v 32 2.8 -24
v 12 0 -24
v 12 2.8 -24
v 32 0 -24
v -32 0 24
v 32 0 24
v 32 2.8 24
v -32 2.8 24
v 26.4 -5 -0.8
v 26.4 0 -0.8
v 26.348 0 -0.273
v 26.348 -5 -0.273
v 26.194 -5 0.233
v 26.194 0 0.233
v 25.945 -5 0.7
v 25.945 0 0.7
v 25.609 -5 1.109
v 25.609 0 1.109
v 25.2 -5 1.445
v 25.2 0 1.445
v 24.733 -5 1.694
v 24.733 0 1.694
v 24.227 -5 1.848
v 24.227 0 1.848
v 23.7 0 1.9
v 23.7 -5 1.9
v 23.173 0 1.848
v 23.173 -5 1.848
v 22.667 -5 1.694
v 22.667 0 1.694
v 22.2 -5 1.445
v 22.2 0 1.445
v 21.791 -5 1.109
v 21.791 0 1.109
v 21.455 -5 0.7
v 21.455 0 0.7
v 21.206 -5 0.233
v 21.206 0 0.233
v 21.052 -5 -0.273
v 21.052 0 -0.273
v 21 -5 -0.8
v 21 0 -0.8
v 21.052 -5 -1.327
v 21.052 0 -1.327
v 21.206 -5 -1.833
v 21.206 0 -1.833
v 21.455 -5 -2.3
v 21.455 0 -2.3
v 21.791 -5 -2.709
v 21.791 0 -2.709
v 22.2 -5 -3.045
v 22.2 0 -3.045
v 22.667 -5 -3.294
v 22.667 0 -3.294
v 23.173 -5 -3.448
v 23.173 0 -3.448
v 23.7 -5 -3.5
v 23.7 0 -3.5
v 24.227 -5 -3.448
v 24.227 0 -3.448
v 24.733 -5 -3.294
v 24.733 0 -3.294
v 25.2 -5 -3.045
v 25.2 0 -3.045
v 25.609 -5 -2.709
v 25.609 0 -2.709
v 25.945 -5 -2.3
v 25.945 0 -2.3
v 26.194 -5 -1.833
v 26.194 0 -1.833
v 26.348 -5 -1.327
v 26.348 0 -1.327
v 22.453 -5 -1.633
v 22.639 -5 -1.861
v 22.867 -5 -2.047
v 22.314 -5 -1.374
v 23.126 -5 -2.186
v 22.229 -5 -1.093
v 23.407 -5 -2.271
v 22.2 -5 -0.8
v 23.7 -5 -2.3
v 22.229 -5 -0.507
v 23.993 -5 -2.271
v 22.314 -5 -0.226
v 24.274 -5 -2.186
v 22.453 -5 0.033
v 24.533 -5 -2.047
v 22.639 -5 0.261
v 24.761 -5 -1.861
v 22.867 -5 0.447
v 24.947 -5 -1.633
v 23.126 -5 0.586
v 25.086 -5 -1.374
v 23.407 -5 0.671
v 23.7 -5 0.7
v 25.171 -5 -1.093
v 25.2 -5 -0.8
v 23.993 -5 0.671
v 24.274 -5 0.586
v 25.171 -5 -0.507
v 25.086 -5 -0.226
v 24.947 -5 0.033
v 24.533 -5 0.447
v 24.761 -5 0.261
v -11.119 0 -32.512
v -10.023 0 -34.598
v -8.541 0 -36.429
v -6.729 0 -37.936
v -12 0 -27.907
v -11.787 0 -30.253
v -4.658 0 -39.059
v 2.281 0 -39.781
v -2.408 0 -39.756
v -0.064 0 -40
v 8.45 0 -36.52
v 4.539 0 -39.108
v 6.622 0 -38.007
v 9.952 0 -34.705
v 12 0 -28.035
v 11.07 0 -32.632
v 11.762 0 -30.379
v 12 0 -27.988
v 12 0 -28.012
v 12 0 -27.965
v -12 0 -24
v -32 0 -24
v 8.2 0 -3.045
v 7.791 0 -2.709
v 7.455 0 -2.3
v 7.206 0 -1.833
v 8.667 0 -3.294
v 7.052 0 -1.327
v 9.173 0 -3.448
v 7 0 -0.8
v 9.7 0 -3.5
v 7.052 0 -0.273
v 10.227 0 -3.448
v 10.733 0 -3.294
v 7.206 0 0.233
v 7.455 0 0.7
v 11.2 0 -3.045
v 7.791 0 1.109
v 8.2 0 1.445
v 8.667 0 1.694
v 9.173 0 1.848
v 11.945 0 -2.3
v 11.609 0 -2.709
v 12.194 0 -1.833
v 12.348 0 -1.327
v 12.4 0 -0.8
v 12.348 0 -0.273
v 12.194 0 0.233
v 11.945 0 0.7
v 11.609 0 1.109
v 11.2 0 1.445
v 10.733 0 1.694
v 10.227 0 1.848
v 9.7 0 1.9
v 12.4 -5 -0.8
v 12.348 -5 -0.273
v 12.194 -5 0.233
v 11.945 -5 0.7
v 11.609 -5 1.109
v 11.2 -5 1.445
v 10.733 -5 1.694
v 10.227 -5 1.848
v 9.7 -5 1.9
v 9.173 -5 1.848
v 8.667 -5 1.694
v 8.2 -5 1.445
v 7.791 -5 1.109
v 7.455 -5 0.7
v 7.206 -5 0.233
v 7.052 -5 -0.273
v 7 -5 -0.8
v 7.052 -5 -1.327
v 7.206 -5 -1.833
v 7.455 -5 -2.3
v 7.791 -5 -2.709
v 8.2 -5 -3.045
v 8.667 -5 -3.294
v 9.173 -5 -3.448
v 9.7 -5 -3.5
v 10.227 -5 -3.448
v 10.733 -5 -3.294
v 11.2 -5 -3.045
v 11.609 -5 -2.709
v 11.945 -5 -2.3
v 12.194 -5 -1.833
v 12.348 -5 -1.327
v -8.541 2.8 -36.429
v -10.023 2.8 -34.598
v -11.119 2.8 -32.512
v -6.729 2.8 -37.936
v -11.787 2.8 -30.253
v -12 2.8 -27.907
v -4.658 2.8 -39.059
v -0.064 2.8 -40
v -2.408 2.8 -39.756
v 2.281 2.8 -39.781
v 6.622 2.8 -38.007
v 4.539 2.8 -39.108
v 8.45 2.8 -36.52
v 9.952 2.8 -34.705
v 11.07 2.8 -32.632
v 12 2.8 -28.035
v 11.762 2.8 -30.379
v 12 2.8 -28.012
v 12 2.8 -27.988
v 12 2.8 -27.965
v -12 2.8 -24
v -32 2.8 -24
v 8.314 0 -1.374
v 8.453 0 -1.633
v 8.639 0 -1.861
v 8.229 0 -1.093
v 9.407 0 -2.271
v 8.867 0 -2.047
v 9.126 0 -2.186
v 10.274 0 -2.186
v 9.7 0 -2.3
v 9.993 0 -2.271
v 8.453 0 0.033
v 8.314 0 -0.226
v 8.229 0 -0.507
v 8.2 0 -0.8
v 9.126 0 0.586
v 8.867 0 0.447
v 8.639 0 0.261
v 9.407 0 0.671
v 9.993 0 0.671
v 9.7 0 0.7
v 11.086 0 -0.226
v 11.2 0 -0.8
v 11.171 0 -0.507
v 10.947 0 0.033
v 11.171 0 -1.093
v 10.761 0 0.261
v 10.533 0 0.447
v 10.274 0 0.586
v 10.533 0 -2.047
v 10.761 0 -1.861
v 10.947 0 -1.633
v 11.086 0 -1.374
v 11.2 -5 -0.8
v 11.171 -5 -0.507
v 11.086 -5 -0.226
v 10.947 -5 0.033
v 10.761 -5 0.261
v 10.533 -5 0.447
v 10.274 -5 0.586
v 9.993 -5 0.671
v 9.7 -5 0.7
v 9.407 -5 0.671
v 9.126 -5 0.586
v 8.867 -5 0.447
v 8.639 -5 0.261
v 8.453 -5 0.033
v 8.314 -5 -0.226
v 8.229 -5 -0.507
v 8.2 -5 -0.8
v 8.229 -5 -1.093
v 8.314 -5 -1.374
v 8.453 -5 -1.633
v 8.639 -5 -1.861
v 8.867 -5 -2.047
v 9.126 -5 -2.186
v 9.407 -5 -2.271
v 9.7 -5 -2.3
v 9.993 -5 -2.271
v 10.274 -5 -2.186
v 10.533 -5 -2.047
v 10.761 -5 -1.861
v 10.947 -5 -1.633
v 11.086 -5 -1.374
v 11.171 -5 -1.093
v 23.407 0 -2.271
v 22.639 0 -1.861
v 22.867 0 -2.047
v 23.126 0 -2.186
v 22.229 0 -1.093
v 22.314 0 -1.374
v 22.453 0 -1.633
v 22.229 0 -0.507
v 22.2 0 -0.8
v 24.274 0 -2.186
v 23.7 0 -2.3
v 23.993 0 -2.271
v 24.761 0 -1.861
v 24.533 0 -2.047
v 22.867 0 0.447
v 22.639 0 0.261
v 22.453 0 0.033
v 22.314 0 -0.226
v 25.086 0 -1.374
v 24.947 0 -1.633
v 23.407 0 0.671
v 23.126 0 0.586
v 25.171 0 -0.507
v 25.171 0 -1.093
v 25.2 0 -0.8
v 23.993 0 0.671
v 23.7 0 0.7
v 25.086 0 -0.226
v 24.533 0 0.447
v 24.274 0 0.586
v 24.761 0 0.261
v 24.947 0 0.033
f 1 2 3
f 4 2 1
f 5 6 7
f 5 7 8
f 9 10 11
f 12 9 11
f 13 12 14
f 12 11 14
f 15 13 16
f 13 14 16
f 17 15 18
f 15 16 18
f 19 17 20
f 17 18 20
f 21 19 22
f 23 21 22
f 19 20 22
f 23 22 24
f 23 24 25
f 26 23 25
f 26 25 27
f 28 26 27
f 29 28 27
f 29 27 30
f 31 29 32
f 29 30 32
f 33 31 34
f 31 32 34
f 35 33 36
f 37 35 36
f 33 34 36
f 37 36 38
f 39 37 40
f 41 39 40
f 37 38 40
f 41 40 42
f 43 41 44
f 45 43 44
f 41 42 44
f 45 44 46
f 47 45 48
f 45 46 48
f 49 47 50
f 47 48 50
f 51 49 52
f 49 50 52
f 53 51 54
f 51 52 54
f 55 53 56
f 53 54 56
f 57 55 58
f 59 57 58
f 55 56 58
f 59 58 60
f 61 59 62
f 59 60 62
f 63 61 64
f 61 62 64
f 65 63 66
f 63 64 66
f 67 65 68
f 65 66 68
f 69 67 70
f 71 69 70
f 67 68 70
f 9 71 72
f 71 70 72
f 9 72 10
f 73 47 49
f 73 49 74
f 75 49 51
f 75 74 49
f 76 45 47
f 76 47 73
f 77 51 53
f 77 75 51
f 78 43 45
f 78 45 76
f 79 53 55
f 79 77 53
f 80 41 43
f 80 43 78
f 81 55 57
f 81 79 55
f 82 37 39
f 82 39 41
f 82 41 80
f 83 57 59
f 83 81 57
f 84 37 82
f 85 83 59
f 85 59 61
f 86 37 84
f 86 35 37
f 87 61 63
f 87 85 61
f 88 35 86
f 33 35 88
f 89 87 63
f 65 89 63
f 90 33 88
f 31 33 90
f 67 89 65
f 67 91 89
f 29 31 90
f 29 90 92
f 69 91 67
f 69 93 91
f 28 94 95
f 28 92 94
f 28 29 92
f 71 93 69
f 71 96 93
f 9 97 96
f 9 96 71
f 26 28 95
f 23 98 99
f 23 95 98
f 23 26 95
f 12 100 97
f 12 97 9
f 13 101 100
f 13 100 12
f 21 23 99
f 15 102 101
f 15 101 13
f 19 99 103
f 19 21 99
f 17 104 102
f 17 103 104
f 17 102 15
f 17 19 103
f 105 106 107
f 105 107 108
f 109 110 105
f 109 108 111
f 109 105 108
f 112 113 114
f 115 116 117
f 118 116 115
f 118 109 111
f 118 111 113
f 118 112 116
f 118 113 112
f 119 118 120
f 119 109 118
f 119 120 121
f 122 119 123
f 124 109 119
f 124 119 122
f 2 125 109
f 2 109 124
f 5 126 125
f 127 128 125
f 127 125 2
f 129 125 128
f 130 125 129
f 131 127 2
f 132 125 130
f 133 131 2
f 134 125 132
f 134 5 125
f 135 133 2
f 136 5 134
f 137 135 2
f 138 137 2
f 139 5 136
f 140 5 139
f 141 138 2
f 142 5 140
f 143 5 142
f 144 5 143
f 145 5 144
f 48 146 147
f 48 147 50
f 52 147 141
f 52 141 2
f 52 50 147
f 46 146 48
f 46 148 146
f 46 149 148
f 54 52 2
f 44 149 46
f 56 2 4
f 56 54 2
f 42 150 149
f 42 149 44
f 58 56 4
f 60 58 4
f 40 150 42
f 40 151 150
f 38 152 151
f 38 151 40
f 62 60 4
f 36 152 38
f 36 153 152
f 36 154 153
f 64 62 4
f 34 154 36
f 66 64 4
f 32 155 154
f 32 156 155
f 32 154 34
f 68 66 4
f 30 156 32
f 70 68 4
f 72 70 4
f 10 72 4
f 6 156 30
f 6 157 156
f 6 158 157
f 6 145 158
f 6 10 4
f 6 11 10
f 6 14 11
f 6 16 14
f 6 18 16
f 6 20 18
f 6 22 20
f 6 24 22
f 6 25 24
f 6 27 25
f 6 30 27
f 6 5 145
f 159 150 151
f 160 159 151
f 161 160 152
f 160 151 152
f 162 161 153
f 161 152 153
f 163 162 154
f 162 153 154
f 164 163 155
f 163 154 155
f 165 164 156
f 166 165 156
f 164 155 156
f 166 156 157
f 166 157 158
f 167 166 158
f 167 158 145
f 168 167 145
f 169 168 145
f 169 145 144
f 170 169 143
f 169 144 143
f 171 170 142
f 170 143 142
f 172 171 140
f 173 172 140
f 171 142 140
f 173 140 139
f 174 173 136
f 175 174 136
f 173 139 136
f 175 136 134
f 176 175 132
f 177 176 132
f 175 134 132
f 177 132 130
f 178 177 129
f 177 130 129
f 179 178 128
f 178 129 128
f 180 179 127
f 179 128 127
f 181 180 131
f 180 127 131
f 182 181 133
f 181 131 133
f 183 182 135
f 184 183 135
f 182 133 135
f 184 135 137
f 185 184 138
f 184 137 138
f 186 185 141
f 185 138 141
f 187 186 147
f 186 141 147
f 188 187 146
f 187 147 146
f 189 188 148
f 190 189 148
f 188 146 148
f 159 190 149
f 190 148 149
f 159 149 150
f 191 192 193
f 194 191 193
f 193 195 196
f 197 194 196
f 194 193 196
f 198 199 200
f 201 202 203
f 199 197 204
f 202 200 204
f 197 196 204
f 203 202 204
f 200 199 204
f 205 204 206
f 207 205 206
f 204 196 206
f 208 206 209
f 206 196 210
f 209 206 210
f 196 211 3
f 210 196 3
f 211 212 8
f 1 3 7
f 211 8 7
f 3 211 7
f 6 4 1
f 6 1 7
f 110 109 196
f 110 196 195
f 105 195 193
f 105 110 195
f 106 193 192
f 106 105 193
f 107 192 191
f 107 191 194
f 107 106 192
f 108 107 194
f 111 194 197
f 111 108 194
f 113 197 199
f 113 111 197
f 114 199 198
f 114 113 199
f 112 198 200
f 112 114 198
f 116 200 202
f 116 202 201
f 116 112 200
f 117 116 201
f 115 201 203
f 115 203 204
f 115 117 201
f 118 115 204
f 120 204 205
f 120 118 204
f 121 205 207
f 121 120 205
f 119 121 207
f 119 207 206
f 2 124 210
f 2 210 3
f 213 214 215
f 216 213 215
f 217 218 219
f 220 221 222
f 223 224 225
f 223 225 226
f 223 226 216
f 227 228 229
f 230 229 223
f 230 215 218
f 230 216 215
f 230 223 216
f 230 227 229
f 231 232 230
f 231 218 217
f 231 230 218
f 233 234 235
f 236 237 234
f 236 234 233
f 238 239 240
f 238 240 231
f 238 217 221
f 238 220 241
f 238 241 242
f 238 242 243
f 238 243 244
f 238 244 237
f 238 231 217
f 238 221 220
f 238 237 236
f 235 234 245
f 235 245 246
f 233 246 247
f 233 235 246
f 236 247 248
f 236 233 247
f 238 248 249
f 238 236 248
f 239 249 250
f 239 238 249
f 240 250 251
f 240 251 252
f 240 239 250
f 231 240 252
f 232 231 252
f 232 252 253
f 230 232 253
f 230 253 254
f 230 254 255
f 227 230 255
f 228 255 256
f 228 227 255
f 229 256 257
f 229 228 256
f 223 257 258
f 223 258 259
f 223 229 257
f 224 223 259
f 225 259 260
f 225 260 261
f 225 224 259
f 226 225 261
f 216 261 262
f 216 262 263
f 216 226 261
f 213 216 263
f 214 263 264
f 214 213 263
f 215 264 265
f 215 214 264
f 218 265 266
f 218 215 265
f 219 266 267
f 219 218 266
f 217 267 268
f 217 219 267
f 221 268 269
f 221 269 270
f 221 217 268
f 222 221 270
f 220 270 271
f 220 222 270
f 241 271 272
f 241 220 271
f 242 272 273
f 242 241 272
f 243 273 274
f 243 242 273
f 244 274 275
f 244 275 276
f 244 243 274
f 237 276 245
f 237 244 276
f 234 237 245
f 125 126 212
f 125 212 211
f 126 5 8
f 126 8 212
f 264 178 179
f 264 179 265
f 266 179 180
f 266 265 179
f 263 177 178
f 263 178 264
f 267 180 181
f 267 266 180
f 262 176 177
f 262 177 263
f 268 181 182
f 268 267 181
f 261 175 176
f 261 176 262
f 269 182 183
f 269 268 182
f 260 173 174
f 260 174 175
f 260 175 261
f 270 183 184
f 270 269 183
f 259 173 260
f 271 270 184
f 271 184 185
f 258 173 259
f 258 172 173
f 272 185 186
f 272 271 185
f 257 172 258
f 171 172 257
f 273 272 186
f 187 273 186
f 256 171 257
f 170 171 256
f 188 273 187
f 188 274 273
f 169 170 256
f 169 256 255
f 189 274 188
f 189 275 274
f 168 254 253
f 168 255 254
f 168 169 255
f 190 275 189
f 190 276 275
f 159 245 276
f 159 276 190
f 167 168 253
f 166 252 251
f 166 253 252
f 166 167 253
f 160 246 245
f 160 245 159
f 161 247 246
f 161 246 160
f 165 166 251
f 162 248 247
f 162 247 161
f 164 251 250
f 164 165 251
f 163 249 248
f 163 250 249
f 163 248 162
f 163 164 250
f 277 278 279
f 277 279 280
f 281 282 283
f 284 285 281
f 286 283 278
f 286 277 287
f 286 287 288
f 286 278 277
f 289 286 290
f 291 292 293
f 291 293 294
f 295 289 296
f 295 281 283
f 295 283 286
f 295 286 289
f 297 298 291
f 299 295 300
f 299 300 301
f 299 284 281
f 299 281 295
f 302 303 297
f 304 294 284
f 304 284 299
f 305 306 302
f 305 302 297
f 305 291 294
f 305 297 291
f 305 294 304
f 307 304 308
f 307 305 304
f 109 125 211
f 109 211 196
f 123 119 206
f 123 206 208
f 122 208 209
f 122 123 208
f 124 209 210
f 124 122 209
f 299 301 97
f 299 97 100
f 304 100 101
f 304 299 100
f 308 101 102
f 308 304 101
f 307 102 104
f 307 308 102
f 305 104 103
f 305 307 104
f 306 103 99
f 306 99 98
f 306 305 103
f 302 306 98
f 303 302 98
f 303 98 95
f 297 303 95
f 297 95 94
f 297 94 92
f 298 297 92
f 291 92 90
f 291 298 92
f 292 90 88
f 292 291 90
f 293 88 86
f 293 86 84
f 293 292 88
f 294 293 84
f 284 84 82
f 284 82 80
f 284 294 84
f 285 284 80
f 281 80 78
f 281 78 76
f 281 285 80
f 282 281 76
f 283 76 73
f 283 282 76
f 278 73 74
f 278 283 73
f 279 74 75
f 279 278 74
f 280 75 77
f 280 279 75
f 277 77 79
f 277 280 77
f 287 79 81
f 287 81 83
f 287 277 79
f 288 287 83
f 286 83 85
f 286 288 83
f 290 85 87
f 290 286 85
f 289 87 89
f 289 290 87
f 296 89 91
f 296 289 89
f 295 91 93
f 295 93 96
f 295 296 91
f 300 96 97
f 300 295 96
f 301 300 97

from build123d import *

# Parameters (mm, degrees)
F0_R     = 2.7
F0_R_2   = 1.5
F1_DEPTH = 5
F2_DEPTH = 2.8


with BuildPart() as f1:
    # F0 (on Front) → F1 (new body)
    with BuildSketch(Plane.XZ):
        with Locations((23.7, -0.8)):
            Circle(F0_R)
        with Locations((23.7, -0.8)):
            Circle(F0_R_2, mode=Mode.SUBTRACT)
    extrude(amount=F1_DEPTH)



with BuildPart() as f1b:
    # F0 (on Front) → F1, piece 2 (new body)
    with BuildSketch(Plane.XZ):
        with Locations((9.7, -0.8)):
            Circle(F0_R)
        with Locations((9.7, -0.8)):
            Circle(F0_R_2, mode=Mode.SUBTRACT)
    extrude(amount=F1_DEPTH)


with BuildPart() as f1_1:
    add(f1.part)

    add(f1b.part)  # F2 merges F1b
    # F0 (on Front) → F2 (join)
    with BuildSketch(Plane.XZ):
        with BuildLine():
            Line((11.9999478371, -24), (32, -24))
            Line((32, -24), (32, 24))
            Line((32, 24), (-32, 24))
            Line((-32, 24), (-32, -24))
            Line((-32, -24), (-11.9996363419, -24))
            Line((-11.9996363419, -24), (-11.9996363419, -27.906578041))
            ThreePointArc((-11.9996363419, -27.906578041), (-0.0644023145, -39.9998271797), (11.9999478371, -28.0353822933))
            ThreePointArc((11.9999478371, -28.0353822933), (12, -28), (11.9999478371, -27.9646177067))
            Line((11.9999478371, -27.9646177067), (11.9999478371, -24))
        make_face()
        with Locations((9.7, -0.8)):
            Circle(F0_R, mode=Mode.SUBTRACT)
        with Locations((23.7, -0.8)):
            Circle(F0_R, mode=Mode.SUBTRACT)
        with Locations((9.7, -0.8)):
            Circle(F0_R)
        with Locations((9.7, -0.8)):
            Circle(F0_R_2, mode=Mode.SUBTRACT)
        with Locations((9.7, -0.8)):
            Circle(F0_R_2)
        with Locations((23.7, -0.8)):
            Circle(F0_R)
        with Locations((23.7, -0.8)):
            Circle(F0_R_2, mode=Mode.SUBTRACT)
        with Locations((23.7, -0.8)):
            Circle(F0_R_2)
    extrude(amount=-F2_DEPTH)


solid = f1_1.part
